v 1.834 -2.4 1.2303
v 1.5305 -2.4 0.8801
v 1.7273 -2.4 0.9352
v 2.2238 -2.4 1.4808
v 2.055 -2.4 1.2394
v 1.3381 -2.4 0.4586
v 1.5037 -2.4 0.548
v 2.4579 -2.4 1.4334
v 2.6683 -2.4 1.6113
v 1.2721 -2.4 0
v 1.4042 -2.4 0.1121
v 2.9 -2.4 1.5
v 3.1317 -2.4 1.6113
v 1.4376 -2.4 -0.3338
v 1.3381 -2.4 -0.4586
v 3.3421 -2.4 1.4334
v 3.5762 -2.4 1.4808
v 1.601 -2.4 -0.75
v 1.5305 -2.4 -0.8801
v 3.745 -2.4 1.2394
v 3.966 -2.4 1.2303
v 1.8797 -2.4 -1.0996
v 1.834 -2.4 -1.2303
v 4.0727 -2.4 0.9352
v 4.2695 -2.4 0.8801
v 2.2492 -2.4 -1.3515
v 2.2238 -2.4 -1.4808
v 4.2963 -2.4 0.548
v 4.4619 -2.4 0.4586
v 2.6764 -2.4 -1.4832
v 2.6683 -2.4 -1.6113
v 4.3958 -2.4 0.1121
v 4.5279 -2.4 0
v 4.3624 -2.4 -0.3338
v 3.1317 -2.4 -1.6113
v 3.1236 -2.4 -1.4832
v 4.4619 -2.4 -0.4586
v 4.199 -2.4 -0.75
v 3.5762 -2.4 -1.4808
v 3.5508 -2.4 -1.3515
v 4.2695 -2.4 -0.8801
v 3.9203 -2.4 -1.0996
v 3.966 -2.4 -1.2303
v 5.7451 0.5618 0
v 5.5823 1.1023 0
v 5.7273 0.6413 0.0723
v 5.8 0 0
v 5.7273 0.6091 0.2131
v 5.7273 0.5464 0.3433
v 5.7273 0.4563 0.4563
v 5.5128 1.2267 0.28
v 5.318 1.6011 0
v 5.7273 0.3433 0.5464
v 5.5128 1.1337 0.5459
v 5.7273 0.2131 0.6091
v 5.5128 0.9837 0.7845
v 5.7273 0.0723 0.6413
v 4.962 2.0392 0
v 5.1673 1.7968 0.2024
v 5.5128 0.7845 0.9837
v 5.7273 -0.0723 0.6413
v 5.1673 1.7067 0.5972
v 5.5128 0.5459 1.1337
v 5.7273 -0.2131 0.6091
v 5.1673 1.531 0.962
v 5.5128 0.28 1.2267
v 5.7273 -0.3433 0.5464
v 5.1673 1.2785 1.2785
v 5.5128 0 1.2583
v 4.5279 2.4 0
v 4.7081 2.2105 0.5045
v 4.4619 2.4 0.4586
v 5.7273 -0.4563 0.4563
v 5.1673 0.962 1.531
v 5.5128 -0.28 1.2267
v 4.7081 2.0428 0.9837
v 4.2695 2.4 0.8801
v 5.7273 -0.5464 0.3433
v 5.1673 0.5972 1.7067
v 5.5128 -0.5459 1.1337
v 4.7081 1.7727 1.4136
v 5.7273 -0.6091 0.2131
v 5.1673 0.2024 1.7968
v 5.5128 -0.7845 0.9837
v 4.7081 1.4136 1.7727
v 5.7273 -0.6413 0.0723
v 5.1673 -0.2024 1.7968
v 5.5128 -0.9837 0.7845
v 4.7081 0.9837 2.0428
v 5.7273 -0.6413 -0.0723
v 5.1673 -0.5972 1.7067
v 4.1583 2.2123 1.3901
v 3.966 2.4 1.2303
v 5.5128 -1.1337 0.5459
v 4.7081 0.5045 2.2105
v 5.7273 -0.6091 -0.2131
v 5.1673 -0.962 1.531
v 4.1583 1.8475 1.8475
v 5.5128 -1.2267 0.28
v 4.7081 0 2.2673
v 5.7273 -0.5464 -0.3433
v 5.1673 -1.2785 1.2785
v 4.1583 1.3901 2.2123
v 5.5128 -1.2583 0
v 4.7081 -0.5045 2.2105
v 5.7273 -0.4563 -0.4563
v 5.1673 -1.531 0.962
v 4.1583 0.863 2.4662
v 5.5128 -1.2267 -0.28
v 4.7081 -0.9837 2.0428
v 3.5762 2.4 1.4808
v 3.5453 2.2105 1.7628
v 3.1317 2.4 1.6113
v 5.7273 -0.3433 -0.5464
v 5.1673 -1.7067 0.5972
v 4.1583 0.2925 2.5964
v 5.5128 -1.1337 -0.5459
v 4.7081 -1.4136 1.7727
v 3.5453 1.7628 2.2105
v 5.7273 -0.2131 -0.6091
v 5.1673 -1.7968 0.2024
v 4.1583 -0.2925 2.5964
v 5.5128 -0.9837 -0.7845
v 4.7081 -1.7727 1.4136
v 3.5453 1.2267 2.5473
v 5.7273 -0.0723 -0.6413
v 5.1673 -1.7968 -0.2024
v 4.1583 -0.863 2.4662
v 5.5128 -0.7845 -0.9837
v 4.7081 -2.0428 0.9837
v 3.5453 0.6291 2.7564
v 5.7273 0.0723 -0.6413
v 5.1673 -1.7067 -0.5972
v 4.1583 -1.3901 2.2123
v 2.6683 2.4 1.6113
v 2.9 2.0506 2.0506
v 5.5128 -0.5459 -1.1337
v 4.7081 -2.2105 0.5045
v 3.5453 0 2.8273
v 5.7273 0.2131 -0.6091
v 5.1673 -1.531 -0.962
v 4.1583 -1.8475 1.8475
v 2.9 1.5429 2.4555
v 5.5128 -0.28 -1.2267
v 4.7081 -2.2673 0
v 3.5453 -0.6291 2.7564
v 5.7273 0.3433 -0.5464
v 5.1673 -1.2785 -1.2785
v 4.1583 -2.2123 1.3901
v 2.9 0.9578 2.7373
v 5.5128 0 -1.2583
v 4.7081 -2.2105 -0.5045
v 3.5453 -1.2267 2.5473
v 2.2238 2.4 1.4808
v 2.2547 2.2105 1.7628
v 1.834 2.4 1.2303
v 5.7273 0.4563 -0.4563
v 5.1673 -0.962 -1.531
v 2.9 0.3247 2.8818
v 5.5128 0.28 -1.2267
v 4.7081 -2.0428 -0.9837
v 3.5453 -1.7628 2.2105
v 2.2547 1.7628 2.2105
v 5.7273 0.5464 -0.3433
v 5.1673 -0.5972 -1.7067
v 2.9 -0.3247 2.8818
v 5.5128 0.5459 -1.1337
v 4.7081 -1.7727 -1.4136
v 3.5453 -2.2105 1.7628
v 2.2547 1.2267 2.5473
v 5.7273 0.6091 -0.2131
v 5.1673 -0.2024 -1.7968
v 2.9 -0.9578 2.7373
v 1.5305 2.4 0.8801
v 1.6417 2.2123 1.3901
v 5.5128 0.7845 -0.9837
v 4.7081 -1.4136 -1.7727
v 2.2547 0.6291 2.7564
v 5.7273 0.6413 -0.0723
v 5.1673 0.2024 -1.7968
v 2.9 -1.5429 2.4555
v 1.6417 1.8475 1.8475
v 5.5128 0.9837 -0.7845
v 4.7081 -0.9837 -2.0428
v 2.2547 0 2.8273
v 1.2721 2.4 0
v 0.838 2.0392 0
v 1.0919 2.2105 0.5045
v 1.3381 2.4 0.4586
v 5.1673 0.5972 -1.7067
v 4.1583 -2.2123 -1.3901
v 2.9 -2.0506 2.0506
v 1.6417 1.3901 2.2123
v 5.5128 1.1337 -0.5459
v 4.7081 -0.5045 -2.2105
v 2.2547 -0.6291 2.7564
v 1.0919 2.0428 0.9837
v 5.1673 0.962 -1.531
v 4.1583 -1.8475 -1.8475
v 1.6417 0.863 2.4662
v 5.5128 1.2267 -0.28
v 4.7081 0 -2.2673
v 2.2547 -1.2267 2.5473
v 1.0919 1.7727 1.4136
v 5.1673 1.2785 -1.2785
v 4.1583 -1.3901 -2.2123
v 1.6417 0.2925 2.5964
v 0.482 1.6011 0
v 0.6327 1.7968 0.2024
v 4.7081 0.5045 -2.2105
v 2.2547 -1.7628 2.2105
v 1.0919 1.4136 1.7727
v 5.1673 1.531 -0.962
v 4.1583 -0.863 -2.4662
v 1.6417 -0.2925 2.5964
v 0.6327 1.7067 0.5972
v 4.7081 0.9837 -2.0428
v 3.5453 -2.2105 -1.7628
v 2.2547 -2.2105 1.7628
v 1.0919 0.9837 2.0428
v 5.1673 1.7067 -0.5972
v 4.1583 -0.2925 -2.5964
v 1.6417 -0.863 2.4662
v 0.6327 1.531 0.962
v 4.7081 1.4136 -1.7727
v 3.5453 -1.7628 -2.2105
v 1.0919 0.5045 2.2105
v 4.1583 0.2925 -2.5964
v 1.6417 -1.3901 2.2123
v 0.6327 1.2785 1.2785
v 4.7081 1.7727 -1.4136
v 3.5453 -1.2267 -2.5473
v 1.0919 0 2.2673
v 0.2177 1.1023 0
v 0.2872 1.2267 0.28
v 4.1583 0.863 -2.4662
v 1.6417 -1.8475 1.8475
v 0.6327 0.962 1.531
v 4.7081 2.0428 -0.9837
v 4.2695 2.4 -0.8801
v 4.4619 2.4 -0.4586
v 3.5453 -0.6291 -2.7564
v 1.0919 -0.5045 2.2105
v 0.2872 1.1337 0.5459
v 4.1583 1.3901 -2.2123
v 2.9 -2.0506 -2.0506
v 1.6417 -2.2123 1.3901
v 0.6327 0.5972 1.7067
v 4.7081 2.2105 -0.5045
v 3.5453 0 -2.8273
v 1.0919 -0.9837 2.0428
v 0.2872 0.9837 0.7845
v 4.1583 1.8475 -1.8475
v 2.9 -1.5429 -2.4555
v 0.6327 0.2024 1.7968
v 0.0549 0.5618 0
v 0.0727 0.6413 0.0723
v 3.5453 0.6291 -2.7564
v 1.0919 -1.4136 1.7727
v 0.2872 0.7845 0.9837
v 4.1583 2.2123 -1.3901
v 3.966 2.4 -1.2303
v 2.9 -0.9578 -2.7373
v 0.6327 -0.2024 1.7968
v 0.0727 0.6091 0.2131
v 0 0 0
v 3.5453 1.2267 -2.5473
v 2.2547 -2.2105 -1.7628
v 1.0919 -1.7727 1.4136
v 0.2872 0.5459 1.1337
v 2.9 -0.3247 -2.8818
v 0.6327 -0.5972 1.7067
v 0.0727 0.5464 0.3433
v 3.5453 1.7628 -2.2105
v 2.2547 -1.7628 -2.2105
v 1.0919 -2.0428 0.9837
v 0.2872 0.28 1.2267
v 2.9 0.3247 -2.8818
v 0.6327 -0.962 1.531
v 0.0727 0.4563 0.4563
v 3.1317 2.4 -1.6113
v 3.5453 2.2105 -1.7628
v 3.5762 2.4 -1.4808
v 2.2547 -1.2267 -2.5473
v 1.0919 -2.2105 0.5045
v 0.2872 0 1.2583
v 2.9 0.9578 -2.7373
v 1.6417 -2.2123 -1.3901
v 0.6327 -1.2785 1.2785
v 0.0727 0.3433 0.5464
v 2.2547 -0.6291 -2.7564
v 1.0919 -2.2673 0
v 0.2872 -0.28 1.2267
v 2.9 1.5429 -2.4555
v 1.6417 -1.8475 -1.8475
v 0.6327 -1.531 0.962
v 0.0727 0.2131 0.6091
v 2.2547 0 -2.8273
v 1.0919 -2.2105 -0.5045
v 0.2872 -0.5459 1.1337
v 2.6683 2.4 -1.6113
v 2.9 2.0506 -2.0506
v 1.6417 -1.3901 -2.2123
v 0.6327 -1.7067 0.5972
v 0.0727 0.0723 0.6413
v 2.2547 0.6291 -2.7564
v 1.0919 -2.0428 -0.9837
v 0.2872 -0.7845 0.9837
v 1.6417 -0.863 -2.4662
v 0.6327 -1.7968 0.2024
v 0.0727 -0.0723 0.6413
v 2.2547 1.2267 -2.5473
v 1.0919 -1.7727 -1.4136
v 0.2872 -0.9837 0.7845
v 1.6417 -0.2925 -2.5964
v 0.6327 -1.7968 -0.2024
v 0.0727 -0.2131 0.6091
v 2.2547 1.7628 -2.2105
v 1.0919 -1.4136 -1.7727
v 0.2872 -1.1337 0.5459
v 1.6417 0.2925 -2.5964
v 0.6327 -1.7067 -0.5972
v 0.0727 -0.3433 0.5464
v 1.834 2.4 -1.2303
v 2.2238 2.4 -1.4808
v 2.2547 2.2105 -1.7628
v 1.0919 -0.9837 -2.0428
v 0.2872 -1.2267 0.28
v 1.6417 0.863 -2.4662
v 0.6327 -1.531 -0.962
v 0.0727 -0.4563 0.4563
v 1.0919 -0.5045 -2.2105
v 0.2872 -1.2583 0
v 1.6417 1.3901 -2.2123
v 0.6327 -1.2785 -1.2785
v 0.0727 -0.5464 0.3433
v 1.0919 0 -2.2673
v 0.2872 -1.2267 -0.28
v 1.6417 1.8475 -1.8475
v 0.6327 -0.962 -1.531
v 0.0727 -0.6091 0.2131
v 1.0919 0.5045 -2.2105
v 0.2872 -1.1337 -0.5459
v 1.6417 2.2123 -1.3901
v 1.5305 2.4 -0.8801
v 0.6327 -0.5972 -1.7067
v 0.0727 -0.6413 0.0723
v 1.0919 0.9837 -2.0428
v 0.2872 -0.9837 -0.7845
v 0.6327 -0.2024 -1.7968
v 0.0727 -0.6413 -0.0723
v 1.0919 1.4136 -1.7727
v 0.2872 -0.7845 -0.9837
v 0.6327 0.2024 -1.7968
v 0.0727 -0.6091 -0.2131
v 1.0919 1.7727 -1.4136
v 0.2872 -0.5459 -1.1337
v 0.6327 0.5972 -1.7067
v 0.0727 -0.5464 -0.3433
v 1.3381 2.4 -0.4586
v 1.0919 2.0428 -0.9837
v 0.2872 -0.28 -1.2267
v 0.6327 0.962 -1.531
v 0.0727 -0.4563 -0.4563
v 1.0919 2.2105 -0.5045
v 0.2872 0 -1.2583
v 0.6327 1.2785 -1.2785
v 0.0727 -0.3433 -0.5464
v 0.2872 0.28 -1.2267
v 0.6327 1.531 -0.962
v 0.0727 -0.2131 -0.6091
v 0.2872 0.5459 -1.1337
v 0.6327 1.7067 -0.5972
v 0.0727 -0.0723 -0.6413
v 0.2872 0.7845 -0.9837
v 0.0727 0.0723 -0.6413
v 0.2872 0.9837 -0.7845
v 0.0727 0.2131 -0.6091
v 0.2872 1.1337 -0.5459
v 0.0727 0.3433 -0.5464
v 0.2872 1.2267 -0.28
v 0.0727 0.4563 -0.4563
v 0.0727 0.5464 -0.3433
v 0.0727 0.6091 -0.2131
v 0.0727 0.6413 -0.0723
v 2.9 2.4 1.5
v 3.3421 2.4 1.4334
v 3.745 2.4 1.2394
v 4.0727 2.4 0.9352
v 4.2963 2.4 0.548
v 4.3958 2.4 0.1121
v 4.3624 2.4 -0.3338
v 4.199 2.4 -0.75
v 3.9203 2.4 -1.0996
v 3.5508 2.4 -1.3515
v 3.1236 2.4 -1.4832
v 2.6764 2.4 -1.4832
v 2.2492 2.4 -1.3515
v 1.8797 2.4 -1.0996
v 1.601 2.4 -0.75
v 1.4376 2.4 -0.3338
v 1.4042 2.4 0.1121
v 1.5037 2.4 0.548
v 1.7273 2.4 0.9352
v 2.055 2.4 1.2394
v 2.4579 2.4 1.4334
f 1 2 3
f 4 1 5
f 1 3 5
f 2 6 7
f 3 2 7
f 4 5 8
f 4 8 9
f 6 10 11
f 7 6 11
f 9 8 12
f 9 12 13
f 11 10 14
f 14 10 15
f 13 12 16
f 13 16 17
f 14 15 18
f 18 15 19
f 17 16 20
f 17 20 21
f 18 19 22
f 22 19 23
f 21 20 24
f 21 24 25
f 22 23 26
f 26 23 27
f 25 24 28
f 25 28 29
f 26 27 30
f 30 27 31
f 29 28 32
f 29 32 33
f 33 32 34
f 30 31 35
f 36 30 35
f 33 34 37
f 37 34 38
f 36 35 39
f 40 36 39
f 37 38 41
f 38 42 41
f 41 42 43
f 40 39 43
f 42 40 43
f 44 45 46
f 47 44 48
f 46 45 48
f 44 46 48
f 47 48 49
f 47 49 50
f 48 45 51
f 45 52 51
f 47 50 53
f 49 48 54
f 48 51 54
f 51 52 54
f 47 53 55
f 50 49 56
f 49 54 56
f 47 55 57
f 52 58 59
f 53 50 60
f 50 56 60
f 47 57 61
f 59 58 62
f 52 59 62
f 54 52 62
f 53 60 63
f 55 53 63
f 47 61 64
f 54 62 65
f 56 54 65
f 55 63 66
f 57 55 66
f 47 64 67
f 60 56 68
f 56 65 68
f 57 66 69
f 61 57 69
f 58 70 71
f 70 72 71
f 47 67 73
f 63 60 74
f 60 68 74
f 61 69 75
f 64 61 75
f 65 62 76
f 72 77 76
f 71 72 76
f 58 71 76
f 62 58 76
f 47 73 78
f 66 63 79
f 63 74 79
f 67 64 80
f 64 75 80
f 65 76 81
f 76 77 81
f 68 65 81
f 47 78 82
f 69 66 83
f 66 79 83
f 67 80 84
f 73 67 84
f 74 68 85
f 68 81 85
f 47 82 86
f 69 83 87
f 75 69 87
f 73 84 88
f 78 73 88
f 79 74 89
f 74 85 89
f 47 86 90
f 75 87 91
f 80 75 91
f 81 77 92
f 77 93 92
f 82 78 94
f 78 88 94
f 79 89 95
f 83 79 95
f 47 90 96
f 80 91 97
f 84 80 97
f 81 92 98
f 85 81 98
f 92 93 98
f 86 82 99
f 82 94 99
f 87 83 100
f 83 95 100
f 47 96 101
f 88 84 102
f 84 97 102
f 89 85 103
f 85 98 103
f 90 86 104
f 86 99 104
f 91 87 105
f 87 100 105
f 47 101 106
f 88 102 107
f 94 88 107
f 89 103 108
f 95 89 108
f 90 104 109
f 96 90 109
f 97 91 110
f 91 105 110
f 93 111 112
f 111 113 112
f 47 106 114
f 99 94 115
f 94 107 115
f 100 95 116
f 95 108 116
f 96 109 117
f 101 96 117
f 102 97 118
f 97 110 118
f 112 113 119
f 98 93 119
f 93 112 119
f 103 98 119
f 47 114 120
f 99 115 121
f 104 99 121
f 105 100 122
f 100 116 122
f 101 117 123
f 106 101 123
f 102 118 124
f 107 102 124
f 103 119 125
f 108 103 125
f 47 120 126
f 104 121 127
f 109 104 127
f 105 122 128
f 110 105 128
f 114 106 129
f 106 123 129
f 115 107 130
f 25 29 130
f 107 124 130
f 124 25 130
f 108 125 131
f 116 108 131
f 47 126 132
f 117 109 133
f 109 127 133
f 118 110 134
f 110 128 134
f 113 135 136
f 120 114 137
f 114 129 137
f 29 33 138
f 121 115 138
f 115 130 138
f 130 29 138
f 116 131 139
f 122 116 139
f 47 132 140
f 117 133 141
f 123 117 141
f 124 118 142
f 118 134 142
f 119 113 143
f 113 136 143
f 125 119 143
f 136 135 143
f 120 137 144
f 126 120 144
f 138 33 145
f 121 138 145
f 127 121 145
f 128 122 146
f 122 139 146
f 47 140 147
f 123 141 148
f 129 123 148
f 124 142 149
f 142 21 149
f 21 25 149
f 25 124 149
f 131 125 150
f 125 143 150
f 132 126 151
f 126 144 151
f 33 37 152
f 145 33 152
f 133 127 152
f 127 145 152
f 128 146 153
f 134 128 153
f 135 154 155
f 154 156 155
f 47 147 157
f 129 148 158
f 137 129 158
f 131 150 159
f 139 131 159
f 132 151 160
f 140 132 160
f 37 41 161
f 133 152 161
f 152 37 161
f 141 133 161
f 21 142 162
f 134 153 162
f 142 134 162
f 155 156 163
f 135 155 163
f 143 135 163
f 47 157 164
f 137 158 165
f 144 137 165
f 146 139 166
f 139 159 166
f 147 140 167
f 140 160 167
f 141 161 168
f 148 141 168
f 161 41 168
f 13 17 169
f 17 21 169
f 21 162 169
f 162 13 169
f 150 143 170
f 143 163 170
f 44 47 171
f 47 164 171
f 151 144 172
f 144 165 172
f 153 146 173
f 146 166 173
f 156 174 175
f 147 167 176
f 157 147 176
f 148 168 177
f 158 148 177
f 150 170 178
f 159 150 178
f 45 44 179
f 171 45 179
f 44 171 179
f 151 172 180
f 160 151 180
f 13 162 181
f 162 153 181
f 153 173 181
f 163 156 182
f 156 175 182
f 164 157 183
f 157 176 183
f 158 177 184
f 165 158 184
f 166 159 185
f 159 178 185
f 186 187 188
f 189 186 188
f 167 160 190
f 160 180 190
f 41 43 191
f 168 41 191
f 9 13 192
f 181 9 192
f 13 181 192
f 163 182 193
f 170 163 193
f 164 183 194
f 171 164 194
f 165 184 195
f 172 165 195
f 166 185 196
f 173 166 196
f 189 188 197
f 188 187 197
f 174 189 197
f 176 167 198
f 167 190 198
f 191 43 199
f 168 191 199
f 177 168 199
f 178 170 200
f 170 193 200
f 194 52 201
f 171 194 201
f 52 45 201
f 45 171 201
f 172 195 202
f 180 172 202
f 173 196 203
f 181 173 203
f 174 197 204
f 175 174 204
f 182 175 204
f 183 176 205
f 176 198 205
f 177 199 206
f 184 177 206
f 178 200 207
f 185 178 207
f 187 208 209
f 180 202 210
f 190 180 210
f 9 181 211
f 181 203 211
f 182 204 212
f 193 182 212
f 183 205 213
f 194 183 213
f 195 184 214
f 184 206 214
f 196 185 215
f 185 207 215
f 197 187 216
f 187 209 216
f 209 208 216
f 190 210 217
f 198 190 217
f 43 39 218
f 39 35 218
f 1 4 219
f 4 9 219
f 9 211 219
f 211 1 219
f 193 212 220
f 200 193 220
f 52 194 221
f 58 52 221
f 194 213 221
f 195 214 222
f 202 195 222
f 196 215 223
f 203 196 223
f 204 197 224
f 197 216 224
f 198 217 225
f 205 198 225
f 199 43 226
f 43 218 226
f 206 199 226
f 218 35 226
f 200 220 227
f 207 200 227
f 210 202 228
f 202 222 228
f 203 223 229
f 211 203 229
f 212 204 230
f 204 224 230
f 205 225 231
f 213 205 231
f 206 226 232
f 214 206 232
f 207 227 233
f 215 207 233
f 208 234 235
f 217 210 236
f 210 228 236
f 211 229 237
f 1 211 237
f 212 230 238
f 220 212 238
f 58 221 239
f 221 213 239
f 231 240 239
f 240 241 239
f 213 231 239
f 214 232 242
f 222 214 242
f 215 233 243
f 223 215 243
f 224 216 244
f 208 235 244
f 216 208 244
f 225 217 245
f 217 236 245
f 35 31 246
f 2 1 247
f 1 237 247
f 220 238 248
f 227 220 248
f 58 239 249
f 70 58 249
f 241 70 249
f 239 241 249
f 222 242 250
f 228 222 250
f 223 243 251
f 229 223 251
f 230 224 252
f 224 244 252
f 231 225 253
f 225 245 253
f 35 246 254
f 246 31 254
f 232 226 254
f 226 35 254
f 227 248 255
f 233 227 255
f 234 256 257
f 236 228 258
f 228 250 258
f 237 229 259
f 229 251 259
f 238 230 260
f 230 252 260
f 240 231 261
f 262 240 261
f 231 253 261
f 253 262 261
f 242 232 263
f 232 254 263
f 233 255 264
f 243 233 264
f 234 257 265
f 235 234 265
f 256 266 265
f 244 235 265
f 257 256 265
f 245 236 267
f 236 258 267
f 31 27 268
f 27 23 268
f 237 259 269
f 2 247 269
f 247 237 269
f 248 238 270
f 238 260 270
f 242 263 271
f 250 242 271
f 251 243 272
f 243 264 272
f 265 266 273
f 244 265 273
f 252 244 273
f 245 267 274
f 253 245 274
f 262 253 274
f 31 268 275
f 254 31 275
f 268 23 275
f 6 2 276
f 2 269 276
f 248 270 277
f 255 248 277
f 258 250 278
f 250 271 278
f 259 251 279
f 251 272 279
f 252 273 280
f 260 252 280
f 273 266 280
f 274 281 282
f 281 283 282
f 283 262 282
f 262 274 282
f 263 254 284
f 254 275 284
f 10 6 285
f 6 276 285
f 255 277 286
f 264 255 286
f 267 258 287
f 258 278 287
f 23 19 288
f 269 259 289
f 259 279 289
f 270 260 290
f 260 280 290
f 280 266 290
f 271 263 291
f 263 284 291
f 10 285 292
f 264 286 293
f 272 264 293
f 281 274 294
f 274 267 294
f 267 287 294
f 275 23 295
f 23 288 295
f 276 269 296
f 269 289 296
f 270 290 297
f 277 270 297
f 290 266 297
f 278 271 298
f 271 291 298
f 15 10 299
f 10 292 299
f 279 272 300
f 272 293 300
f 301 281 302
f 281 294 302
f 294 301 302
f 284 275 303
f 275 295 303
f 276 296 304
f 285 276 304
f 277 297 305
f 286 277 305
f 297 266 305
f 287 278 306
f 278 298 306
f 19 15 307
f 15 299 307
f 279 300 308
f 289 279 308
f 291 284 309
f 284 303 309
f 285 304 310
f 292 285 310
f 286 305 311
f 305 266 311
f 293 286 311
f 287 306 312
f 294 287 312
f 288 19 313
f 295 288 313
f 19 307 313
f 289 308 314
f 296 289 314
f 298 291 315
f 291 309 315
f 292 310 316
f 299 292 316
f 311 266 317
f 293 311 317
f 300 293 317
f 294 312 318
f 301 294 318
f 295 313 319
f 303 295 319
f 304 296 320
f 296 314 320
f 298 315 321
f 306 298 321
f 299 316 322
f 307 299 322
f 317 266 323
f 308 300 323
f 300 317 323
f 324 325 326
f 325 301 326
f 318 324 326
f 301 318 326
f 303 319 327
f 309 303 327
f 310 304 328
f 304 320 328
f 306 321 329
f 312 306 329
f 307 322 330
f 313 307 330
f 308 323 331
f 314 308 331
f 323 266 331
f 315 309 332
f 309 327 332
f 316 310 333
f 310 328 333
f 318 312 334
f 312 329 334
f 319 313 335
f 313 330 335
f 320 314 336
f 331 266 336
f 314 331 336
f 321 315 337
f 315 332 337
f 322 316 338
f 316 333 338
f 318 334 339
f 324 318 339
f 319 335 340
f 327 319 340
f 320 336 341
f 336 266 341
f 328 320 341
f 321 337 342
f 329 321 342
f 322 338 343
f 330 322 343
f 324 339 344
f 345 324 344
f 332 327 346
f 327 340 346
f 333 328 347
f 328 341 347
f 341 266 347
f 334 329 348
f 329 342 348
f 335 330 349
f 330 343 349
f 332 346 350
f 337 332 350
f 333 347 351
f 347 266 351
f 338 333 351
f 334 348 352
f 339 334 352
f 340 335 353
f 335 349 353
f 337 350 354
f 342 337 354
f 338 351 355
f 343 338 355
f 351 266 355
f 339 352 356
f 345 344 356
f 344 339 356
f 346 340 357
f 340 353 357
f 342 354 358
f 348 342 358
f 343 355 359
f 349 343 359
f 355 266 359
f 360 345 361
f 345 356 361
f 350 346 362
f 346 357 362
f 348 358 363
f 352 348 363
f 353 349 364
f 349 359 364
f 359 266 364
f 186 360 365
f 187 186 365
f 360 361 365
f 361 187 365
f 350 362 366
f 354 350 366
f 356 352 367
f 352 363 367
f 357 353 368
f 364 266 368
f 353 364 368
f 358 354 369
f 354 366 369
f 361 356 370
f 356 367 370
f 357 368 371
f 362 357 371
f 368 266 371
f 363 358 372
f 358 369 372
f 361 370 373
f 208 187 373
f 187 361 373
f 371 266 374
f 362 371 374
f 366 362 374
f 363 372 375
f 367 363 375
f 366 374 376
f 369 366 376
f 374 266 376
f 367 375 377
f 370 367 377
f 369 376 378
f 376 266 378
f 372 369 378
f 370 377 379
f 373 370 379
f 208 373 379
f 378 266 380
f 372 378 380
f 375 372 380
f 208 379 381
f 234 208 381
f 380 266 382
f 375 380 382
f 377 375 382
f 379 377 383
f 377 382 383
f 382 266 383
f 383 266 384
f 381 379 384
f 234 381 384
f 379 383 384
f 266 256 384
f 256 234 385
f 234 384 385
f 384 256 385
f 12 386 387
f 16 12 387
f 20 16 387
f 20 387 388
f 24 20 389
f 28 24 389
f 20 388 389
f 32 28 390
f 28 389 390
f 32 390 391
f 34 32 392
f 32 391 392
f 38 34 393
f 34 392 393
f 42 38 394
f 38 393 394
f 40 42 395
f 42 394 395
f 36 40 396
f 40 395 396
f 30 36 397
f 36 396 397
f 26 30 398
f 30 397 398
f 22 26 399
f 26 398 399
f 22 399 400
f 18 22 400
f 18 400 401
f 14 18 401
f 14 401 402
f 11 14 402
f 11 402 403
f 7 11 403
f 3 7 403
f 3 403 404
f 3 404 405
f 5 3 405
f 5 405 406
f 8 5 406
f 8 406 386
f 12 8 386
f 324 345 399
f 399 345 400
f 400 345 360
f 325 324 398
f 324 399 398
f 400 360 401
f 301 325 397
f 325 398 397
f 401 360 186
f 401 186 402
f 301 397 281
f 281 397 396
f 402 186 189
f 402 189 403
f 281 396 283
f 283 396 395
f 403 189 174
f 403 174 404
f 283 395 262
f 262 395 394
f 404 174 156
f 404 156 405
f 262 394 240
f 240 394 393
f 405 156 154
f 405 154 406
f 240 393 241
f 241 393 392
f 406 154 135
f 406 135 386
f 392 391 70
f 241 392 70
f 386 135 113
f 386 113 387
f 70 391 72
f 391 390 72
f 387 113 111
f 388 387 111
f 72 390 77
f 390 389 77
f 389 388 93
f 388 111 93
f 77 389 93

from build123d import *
from build123d.topology import SkipClean

# Parameters (mm, degrees)
CUT_EXTRUDE_1_DEPTH = 5
SKETCH_3_R          = 1.5
CUT_EXTRUDE_2_DEPTH = 9.067837381


with BuildPart() as part:
    # 草图1 → 旋转1 (revolve)
    with BuildSketch(Plane.XY):
        with BuildLine():
            Line((0, 0), (5.8, 0))
            ThreePointArc((5.8, 0), (2.9, 2.9), (0, 0))
        make_face()
    revolve(axis=Axis((0, 0, 0), (1, 0, 0)))

    # 草图2 → 切除-拉伸1 (cut, symmetric)
    with SkipClean():  # the faces are left unmerged after this step: merging them gives an invalid solid
        with BuildSketch(Plane.XY):
            with BuildLine():
                Line((1.27211794, -2.4), (4.52788206, -2.4))
                ThreePointArc((4.52788206, -2.4), (2.9, -2.9), (1.27211794, -2.4))
            make_face()
            with BuildLine():
                Line((1.27211794, 2.4), (4.52788206, 2.4))
                ThreePointArc((4.52788206, 2.4), (2.9, 2.9), (1.27211794, 2.4))
            make_face()
        extrude(amount=CUT_EXTRUDE_1_DEPTH, both=True, mode=Mode.SUBTRACT)

    # 草图3 → 切除-拉伸2 (cut, through all)
    with SkipClean():  # the faces are left unmerged after this step: merging them gives an invalid solid
        with BuildSketch(Plane(origin=(0, 2.4, 0), x_dir=(1, 0, 0), z_dir=(0, 1, 0))):
            with Locations(Location((2.9, 0, 0), (0, 0, 270))):
                Circle(SKETCH_3_R)
        extrude(amount=-CUT_EXTRUDE_2_DEPTH, mode=Mode.SUBTRACT)


solid = part.part
